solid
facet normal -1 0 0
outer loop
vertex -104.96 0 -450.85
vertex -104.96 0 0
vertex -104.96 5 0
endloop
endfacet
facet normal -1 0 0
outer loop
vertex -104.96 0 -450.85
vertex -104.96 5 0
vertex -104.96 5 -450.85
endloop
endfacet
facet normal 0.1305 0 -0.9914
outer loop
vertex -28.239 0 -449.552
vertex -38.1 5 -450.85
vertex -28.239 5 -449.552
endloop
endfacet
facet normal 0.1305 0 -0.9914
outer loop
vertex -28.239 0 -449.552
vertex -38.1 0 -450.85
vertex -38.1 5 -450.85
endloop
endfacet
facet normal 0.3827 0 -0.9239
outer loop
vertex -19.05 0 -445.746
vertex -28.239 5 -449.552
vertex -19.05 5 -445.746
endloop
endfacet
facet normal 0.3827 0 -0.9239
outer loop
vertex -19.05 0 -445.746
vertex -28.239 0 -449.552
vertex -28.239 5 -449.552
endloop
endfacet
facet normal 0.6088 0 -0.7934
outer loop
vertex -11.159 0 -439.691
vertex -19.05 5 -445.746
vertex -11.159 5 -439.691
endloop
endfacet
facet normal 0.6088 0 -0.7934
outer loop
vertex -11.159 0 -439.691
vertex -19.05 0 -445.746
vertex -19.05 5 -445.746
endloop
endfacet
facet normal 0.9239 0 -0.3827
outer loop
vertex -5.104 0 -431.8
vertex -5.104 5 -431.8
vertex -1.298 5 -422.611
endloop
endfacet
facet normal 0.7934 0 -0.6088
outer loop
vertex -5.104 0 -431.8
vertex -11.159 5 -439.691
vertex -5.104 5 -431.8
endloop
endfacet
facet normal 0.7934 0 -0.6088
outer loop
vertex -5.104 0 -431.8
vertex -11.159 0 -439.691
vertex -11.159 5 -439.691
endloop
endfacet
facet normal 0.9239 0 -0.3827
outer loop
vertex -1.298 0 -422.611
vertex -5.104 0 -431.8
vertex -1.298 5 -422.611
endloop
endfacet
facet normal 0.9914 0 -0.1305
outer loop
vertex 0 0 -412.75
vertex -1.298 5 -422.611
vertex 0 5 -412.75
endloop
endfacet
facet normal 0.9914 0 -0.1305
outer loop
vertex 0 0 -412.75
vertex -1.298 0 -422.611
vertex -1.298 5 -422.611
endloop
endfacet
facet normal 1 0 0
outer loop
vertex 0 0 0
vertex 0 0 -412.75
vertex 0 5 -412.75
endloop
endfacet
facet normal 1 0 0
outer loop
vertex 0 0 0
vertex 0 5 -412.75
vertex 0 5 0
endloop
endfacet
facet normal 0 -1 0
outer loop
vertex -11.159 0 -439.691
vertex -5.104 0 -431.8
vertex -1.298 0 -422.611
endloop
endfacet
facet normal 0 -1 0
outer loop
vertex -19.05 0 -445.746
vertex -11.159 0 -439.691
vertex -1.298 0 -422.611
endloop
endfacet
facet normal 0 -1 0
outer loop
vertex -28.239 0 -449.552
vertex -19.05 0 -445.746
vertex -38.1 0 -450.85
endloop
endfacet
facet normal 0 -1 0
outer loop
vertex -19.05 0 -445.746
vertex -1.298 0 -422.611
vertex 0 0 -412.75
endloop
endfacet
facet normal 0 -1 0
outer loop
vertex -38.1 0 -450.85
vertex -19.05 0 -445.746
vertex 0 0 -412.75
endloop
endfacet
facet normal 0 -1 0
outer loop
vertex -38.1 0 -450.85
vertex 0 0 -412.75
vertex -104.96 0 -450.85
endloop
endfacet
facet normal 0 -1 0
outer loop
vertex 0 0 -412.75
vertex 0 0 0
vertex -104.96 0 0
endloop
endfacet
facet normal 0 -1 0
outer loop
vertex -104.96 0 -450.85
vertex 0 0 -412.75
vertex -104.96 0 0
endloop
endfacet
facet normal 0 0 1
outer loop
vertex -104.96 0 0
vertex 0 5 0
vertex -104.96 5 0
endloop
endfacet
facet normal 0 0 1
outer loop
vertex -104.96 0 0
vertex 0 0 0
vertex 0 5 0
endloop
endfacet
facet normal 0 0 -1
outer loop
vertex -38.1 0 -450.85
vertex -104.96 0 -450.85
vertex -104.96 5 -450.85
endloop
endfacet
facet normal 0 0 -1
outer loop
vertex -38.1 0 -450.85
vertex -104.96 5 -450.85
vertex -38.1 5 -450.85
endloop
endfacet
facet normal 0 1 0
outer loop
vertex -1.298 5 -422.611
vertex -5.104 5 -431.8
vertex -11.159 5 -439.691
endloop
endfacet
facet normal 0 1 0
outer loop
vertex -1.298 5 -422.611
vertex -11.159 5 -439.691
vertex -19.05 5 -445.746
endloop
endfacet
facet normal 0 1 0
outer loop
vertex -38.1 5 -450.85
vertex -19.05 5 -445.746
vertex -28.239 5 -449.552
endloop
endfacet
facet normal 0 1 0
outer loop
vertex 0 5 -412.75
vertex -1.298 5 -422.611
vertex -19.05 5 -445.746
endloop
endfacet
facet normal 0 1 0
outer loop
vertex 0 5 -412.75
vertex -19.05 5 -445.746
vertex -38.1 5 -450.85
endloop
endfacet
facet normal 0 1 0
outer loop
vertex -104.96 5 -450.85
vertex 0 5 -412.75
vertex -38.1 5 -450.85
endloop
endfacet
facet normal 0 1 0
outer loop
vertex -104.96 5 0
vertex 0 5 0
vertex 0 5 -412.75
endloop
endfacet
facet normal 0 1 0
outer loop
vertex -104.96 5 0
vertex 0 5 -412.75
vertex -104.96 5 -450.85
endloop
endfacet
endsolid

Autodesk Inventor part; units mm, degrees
ref_plane "YZ Plane" through (0, 0, 0) normal (1, 0, 0) x (0, 1, 0)
ref_plane "XZ Plane" through (0, 0, 0) normal (0, 1, 0) x (-1, 0, 0)
ref_plane "XY Plane" through (0, 0, 0) normal (0, 0, 1) x (1, 0, 0)
sketch "Sketch1" plane through (0, 0, 0) normal (0, 1, 0) x (-1, 0, 0)
  line L0 (0, 0) -> (104.9602, 0)
  line L1 (104.9602, 0) -> (104.9602, -450.85)
  line L2 (104.9602, -450.85) -> (38.1, -450.85)
  line L3 (0, -412.75) -> (0, 0)
  arc A0 (0, -412.75) -> (38.1, -450.85) centre (38.1, -412.75) ccw
  line L4 (38.1, -412.75) -> (38.1, -450.85) construction
  line L5 (38.1, -412.75) -> (76.2, -412.75) construction
  dimension "d1" = 450.85
  dimension "d5" = 38.1
  dimension "d6" = 90
  dimension "d7" = 104.9602
  dimension "d8" = 38.1
extrude "Extrusion1" add sketch "Sketch1" along normal blind 5
properties part number "sidewall raw"
